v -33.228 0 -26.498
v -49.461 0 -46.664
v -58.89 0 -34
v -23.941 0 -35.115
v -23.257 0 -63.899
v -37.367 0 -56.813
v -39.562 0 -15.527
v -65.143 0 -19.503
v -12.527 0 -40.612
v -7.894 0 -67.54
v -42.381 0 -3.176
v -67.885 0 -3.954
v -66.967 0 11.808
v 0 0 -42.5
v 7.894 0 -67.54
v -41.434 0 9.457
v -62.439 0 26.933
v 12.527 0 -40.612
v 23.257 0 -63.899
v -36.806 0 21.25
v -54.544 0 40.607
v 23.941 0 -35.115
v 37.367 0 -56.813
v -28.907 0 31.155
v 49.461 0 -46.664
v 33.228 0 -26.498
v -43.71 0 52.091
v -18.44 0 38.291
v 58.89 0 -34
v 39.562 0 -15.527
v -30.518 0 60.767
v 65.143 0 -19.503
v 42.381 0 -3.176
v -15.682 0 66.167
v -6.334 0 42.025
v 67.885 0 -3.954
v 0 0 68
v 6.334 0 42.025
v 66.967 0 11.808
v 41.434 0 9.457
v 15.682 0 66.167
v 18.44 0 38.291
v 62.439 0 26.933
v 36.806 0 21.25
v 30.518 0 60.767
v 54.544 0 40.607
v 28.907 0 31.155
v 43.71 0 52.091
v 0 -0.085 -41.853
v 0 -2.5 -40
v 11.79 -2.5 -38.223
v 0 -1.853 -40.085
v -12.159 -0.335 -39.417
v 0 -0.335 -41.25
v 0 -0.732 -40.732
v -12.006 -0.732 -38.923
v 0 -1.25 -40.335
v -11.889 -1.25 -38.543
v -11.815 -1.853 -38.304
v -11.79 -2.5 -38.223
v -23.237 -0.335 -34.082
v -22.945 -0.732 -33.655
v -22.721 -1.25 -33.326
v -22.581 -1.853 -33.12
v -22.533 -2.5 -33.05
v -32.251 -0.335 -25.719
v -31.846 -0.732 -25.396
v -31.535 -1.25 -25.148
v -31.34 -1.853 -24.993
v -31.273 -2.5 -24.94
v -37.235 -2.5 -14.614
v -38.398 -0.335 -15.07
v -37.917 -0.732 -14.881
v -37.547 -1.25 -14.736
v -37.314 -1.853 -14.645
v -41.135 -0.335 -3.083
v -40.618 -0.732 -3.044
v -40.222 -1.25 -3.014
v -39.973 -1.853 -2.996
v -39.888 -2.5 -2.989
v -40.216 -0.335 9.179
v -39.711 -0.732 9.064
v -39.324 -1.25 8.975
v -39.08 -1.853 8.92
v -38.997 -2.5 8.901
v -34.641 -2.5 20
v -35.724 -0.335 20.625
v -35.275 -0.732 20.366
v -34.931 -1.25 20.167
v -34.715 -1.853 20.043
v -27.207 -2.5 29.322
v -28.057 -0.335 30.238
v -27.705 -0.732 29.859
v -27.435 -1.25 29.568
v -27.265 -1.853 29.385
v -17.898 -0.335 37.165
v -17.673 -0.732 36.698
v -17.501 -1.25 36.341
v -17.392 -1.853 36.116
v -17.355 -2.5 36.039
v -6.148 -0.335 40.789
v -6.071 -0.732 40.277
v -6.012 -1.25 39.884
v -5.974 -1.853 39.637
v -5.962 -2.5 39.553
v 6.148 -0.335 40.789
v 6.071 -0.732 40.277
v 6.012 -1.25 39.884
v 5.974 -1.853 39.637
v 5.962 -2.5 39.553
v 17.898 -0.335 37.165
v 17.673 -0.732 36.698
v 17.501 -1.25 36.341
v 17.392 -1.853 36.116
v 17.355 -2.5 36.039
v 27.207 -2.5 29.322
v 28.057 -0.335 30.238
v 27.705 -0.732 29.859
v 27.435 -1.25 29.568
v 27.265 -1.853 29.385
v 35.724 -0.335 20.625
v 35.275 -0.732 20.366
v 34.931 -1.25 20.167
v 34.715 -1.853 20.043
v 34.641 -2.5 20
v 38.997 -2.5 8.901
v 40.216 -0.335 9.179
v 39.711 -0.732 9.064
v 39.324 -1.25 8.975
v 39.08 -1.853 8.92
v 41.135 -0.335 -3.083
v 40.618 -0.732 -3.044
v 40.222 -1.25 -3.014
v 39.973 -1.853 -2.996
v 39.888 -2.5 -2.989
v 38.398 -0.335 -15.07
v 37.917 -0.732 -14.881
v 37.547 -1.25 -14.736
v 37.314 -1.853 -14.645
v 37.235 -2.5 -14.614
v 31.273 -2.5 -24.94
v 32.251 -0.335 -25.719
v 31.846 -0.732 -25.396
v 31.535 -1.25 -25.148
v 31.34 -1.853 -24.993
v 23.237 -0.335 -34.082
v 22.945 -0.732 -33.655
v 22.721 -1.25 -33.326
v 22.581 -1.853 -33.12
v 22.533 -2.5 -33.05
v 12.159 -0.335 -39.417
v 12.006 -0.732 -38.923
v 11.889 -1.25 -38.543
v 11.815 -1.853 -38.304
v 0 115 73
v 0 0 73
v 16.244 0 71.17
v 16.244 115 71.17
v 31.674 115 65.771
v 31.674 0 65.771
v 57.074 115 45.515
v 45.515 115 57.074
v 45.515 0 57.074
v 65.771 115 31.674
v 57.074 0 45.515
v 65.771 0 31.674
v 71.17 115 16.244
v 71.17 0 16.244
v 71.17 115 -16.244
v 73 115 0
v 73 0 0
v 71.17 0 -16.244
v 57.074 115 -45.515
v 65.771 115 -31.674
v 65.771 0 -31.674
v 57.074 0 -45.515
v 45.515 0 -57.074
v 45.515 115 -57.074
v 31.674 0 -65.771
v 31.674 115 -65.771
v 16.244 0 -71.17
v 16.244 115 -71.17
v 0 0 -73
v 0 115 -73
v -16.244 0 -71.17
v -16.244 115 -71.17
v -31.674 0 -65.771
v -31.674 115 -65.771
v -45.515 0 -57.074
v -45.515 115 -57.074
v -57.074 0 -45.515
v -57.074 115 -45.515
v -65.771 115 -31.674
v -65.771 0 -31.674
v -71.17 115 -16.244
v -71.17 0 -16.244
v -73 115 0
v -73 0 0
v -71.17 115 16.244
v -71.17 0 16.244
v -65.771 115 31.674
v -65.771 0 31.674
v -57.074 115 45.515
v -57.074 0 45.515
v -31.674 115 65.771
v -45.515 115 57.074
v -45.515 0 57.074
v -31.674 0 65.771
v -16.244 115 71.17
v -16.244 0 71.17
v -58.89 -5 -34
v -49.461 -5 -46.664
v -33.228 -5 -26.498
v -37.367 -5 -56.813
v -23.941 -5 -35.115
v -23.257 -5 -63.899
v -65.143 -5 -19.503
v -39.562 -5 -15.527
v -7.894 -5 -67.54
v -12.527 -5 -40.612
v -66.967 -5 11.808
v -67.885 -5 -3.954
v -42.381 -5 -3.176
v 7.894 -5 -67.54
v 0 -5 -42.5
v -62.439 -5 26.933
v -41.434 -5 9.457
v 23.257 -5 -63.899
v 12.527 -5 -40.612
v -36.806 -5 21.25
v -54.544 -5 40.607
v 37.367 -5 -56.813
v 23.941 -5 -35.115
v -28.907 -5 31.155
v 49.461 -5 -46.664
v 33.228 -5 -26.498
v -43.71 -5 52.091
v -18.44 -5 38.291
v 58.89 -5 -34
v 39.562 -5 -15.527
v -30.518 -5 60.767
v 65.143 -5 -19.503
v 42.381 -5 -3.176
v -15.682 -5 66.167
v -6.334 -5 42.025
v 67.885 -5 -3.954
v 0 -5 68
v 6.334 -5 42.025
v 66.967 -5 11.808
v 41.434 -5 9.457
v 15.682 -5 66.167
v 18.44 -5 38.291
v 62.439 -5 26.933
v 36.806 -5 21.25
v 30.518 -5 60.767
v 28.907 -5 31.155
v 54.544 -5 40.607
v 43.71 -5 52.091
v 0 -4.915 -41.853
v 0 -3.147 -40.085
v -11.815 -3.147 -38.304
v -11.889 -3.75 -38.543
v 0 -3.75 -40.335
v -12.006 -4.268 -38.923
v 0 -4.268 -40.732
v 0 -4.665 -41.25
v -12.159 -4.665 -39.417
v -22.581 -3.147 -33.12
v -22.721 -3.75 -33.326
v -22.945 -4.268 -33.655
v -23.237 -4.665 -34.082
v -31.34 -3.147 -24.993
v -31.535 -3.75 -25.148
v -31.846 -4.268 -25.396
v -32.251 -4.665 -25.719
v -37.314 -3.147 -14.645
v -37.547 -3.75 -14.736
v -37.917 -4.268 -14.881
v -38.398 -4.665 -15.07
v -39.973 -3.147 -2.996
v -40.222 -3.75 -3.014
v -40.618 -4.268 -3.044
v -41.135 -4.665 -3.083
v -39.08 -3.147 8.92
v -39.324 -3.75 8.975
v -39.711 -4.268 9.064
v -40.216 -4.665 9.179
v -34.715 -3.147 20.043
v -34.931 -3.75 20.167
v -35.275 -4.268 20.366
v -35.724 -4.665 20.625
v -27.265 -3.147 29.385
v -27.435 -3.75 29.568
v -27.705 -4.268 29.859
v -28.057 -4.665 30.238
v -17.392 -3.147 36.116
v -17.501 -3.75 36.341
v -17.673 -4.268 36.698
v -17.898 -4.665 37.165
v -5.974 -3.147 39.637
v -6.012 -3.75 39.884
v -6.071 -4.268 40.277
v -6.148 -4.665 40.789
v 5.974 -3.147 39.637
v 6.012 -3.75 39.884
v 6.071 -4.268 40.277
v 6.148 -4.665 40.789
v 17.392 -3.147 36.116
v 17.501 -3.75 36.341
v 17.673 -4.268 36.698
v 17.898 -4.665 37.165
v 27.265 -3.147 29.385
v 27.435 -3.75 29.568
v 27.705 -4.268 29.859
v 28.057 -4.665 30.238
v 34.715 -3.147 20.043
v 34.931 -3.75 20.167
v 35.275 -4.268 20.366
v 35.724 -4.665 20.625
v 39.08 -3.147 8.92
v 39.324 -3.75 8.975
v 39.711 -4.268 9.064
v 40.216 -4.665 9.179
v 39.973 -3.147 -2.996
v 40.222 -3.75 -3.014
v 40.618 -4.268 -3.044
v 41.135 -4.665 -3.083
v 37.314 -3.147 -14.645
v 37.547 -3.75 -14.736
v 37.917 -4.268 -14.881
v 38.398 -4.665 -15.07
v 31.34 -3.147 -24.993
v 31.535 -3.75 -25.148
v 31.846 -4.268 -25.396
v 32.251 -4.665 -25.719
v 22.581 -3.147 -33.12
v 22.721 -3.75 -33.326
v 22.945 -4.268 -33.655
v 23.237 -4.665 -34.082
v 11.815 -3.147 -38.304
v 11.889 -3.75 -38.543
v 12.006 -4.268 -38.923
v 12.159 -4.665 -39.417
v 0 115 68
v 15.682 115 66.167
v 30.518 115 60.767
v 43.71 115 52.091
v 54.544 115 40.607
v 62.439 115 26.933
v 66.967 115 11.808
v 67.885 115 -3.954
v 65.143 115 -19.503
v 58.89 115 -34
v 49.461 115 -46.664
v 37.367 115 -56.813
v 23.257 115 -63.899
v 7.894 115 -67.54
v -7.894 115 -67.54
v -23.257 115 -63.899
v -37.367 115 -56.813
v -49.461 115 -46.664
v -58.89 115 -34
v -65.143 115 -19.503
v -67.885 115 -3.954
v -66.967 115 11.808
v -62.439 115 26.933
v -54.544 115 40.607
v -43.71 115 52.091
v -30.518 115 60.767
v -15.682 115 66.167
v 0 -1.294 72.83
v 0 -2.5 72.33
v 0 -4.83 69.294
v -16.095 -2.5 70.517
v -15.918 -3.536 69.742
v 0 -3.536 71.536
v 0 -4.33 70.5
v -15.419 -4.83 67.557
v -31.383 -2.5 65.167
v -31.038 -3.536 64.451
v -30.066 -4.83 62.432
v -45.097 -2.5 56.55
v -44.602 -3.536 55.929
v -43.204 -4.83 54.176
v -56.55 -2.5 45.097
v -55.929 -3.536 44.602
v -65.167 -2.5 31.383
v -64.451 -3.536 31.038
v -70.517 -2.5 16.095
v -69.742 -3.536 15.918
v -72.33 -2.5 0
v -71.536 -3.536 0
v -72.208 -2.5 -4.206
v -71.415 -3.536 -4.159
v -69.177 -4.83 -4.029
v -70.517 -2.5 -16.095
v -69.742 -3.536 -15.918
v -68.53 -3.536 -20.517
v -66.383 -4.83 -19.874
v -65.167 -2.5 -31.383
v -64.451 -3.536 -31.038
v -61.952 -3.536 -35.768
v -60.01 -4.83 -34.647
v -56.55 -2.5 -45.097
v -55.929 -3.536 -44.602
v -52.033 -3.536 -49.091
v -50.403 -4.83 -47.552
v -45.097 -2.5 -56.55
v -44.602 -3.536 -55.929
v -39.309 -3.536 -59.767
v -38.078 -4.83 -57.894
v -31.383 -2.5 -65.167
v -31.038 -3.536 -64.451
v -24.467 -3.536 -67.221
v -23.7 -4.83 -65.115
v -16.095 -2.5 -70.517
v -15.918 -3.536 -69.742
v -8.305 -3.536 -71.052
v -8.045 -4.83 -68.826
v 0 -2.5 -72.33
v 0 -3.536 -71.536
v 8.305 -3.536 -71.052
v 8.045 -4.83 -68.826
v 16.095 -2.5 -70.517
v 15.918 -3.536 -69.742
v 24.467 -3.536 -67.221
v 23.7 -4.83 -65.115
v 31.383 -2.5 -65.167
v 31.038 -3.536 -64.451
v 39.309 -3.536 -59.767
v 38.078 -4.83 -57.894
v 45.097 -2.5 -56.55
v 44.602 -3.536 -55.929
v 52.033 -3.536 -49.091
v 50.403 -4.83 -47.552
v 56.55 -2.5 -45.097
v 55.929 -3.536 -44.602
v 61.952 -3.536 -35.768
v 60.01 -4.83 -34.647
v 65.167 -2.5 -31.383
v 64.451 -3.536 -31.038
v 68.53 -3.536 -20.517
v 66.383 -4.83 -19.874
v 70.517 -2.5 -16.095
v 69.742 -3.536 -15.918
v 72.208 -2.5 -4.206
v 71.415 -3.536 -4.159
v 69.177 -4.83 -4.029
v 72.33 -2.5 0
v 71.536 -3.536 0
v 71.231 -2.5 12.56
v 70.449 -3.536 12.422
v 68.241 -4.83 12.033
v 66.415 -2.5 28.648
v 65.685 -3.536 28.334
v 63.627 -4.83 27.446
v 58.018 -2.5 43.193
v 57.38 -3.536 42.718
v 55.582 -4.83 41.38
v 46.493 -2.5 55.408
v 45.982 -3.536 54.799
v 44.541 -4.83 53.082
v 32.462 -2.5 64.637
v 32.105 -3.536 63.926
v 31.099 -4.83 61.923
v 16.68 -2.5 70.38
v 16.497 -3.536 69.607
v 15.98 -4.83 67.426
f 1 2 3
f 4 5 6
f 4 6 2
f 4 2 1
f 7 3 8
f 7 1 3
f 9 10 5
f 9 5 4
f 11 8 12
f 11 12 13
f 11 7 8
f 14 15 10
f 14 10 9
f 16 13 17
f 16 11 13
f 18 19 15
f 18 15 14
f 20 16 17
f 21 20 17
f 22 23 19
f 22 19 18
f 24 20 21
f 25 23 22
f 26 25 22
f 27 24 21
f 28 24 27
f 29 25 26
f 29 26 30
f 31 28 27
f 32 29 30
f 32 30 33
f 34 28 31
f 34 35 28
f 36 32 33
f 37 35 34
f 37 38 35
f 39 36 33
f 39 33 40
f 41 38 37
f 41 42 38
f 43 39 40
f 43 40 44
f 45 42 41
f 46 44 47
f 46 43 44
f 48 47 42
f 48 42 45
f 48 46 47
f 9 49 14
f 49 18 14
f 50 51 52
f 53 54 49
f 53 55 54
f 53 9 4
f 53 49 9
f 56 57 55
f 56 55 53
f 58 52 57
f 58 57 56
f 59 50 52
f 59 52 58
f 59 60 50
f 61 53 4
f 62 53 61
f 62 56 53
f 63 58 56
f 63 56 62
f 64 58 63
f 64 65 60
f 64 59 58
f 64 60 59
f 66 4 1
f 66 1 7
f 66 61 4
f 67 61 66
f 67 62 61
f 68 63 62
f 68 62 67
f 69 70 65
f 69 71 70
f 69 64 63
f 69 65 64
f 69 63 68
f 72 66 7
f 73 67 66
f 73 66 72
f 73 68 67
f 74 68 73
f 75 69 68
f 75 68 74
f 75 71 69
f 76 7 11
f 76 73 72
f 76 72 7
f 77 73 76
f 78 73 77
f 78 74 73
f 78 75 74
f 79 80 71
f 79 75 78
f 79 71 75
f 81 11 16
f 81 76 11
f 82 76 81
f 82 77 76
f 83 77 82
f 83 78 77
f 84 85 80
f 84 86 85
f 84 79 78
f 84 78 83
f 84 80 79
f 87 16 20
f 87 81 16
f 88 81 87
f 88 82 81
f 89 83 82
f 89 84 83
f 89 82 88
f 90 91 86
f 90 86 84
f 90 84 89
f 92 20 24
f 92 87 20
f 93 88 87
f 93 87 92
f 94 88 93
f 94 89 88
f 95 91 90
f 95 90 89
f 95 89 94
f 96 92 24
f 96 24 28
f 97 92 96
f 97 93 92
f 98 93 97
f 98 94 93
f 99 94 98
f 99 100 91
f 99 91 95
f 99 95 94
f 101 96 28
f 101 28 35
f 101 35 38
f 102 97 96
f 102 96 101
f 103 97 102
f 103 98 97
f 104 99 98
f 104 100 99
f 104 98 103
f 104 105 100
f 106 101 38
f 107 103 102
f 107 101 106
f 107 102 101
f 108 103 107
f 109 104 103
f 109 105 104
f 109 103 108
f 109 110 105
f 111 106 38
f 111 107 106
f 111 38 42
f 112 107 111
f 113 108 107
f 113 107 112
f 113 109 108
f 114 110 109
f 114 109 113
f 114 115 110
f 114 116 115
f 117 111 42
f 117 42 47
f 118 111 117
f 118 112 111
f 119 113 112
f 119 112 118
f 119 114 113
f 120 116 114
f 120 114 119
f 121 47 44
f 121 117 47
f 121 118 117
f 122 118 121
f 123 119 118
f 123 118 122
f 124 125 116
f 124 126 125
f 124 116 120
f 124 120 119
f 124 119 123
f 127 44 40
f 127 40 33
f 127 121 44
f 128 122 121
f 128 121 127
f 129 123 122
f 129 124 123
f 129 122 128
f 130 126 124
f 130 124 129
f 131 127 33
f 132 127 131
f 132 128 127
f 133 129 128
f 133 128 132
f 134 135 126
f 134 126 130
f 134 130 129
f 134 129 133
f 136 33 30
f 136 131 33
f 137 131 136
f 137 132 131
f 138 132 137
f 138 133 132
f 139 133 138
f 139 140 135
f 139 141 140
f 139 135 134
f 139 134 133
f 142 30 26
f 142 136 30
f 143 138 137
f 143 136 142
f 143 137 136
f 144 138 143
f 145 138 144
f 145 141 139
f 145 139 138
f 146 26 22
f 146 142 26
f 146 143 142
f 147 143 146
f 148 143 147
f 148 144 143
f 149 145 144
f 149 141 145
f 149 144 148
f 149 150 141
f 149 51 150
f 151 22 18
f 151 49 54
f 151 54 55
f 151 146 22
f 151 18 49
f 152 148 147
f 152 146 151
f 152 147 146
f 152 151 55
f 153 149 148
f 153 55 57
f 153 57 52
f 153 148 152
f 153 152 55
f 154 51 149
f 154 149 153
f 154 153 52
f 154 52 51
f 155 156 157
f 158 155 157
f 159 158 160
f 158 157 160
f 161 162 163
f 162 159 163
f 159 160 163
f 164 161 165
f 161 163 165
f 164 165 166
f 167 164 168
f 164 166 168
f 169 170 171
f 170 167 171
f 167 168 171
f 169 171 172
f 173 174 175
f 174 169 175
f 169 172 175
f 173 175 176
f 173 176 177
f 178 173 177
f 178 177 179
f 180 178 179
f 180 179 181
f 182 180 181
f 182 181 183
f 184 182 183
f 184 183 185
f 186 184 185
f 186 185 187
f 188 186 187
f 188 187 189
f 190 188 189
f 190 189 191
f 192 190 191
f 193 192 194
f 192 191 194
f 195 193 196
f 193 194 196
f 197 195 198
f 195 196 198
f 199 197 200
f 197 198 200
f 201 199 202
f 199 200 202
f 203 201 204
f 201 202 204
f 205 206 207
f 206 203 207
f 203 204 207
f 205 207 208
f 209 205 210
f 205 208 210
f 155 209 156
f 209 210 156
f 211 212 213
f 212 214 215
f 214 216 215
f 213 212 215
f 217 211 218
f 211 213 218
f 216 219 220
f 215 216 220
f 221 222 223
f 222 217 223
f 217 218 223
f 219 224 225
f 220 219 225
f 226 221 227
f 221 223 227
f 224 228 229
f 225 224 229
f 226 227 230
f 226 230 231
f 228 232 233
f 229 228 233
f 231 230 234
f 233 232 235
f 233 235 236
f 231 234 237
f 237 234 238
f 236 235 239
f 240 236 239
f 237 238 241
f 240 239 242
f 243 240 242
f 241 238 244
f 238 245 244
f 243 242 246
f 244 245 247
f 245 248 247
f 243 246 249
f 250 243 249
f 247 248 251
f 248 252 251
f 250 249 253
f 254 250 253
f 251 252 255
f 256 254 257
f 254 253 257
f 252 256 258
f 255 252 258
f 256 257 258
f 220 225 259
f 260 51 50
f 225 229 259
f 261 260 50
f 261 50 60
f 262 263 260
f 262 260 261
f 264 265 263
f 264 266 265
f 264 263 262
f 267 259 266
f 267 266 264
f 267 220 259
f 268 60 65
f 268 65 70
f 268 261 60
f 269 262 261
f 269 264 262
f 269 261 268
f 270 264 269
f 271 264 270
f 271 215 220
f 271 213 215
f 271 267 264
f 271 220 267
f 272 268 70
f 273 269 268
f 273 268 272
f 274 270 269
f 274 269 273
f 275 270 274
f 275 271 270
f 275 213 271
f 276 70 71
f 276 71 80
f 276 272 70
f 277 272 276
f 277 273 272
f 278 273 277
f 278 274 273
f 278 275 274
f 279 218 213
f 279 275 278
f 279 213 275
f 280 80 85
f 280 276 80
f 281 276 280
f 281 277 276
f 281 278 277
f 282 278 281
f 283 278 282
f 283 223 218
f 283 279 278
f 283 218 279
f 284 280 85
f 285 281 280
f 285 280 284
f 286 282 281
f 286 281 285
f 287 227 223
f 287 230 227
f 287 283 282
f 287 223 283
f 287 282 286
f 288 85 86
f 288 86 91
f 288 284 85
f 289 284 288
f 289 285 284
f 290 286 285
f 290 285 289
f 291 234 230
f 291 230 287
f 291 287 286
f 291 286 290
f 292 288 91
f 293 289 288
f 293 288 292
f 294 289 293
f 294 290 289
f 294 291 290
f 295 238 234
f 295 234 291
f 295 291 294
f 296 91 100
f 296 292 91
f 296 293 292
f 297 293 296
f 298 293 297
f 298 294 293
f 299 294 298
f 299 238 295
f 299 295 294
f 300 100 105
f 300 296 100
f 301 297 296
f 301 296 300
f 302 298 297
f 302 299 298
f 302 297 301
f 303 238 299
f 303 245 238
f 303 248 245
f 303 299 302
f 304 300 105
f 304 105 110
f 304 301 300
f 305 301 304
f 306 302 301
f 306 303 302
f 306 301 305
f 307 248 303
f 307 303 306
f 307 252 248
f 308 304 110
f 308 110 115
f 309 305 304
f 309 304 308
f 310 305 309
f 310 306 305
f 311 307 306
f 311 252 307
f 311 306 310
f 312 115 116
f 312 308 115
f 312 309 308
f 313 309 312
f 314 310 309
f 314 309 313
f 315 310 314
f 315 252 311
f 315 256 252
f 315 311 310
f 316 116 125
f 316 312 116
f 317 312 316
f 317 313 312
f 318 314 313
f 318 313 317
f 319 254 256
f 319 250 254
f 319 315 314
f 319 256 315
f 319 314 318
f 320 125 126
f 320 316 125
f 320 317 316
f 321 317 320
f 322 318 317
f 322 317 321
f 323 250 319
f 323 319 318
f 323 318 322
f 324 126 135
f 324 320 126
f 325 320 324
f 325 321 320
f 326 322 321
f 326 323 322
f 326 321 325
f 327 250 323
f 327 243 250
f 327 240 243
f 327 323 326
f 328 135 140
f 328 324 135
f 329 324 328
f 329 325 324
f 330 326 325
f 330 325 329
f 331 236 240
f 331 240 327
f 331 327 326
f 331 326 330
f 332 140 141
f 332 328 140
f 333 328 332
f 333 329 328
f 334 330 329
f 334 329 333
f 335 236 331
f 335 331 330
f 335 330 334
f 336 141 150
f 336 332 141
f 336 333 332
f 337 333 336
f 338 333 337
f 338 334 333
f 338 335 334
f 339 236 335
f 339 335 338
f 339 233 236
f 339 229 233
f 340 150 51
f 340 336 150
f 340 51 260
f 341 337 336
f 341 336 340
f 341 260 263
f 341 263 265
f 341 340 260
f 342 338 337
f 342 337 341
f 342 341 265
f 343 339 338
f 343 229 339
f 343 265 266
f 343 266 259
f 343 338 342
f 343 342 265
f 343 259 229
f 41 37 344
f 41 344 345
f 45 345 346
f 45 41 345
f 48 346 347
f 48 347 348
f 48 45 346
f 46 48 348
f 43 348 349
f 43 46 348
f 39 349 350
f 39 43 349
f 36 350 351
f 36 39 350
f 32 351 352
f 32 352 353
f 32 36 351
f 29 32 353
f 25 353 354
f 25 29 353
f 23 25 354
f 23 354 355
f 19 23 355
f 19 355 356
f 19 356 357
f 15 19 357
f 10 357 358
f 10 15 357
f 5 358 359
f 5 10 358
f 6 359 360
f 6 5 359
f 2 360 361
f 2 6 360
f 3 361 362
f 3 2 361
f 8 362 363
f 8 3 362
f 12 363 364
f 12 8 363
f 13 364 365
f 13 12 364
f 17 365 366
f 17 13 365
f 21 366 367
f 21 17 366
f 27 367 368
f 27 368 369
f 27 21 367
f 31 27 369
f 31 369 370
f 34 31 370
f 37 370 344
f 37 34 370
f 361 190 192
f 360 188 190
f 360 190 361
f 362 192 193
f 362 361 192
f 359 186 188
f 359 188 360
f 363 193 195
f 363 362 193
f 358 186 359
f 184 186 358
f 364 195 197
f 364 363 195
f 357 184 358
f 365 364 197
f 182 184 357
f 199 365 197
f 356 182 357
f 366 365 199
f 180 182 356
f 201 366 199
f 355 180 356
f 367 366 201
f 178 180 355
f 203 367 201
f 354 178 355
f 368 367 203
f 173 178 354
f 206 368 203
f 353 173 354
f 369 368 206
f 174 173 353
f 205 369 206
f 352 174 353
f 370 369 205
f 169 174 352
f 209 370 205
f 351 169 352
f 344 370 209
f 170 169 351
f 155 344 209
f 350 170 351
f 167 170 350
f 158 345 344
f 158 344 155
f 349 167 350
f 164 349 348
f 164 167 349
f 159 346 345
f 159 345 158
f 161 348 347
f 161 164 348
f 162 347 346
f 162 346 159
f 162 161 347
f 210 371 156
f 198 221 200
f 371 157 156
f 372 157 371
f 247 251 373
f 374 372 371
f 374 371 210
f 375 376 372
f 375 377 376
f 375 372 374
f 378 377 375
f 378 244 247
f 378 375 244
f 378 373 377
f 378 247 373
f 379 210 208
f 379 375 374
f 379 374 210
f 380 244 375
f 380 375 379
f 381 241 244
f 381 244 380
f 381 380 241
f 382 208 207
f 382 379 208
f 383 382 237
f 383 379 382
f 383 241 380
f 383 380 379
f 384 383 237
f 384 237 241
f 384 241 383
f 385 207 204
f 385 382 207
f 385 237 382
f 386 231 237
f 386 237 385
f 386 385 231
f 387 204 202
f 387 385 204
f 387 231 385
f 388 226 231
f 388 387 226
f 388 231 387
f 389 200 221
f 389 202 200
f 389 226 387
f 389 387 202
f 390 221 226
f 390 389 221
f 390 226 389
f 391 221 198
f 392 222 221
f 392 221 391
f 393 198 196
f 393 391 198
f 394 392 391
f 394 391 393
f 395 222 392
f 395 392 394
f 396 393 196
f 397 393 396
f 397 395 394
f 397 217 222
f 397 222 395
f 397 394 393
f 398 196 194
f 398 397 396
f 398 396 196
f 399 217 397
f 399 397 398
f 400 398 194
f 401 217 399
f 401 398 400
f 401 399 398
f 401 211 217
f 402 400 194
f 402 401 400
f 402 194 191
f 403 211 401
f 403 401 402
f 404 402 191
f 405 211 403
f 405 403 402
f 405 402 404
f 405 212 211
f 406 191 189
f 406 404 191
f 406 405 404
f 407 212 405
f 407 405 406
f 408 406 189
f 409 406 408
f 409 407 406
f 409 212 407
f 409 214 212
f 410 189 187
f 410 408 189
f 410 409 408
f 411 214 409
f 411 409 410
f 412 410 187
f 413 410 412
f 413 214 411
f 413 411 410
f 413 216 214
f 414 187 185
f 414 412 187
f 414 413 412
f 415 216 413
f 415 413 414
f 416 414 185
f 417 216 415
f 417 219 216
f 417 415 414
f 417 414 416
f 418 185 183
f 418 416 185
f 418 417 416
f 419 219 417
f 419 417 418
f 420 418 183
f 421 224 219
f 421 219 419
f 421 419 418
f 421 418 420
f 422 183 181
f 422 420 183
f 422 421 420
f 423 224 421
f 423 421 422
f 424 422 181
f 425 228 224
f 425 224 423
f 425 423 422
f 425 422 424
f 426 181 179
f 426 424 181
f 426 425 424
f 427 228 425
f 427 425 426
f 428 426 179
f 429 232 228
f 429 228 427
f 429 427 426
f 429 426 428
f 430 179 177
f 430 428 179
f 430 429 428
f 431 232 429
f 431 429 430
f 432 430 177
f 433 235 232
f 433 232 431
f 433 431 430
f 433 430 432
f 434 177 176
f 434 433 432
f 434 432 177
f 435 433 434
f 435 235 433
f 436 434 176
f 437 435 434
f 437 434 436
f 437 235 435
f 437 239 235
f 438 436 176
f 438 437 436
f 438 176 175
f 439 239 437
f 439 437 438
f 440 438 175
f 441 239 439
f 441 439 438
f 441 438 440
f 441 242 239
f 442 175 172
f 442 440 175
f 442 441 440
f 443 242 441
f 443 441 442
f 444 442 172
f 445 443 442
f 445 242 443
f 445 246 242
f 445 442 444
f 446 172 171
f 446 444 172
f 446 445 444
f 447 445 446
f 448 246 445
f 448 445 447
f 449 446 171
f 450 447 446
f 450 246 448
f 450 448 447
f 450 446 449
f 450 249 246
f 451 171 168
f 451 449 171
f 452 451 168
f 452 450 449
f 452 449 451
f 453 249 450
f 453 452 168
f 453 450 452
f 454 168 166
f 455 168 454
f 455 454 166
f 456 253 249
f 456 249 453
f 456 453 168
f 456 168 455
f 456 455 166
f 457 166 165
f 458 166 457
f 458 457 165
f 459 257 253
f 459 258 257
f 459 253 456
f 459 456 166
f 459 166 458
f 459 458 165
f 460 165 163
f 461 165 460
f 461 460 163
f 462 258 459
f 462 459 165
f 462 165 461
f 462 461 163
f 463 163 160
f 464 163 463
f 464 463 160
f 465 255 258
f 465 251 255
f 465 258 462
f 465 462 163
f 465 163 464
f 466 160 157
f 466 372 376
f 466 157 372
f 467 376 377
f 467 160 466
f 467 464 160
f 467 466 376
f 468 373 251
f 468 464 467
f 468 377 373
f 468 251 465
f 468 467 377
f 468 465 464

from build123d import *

# Parameters (mm, degrees)
SKETCH1_R               = 68
BOSS_EXTRUDE1_DEPTH     = 115
SHELL1_T                = 5
FILLET1_R               = 5
CUT_EXTRUDE1_DEPTH      = 159.297188857
CUT_EXTRUDE1_DEPTH_BACK = 159.297188857
SKETCH2_R               = 40
FILLET3_R               = 2.5


# Some blends are built 0.0001 mm under size
with BuildPart() as part:
    # Sketch1 → Boss-Extrude1 (new body)
    with BuildSketch(Plane(origin=(0, 0, 0), x_dir=(1, 0, 0), z_dir=(0, 1, 0))):
        with Locations(Location((0, 0, 0), (0, 0, 270))):
            Circle(SKETCH1_R)
    extrude(amount=BOSS_EXTRUDE1_DEPTH)

    # Shell1
    shell1_openings = [part.faces().sort_by_distance(p)[0] for p in [
        (0, 115, 0),
    ]]
    offset(amount=SHELL1_T, openings=shell1_openings, kind=Kind.INTERSECTION)

    # Fillet1
    # the kernel refuses this fillet: 5 mm, written as the material it takes off along each edge
    with BuildSketch(Plane(origin=(0, -5, 0), x_dir=(0, 0, 1), z_dir=(1, 0, 0))) as fillet1_piece_1:
        with BuildLine():
            CenterArc((73 - FILLET1_R, -FILLET1_R), FILLET1_R, 0, 90)
            Line((73 - FILLET1_R, 0), (73, 0))
            Line((73, 0), (73, -FILLET1_R))
        make_face()
    revolve(axis=Axis((0, -5, 0), (0, -1, 0)), mode=Mode.SUBTRACT)

    # Sketch2 → Cut-Extrude1 (cut, two sides: drawn at the far end of the back side and taken through both)
    with BuildSketch(Plane.XZ.offset(5).offset(-CUT_EXTRUDE1_DEPTH_BACK)):
        with Locations(Location((0, 0, 0), (0, 0, 270))):
            Circle(SKETCH2_R)
    extrude(amount=CUT_EXTRUDE1_DEPTH + CUT_EXTRUDE1_DEPTH_BACK, mode=Mode.SUBTRACT)

    # Fillet3
    fillet3_edges = [part.edges().sort_by_distance(p)[0] for p in [
        (0, -5, 40),
        (0, 0, 40),
    ]]
    fillet(fillet3_edges, radius=FILLET3_R - 0.0001)  # a hair under: the kernel refuses the full size


solid = part.part
